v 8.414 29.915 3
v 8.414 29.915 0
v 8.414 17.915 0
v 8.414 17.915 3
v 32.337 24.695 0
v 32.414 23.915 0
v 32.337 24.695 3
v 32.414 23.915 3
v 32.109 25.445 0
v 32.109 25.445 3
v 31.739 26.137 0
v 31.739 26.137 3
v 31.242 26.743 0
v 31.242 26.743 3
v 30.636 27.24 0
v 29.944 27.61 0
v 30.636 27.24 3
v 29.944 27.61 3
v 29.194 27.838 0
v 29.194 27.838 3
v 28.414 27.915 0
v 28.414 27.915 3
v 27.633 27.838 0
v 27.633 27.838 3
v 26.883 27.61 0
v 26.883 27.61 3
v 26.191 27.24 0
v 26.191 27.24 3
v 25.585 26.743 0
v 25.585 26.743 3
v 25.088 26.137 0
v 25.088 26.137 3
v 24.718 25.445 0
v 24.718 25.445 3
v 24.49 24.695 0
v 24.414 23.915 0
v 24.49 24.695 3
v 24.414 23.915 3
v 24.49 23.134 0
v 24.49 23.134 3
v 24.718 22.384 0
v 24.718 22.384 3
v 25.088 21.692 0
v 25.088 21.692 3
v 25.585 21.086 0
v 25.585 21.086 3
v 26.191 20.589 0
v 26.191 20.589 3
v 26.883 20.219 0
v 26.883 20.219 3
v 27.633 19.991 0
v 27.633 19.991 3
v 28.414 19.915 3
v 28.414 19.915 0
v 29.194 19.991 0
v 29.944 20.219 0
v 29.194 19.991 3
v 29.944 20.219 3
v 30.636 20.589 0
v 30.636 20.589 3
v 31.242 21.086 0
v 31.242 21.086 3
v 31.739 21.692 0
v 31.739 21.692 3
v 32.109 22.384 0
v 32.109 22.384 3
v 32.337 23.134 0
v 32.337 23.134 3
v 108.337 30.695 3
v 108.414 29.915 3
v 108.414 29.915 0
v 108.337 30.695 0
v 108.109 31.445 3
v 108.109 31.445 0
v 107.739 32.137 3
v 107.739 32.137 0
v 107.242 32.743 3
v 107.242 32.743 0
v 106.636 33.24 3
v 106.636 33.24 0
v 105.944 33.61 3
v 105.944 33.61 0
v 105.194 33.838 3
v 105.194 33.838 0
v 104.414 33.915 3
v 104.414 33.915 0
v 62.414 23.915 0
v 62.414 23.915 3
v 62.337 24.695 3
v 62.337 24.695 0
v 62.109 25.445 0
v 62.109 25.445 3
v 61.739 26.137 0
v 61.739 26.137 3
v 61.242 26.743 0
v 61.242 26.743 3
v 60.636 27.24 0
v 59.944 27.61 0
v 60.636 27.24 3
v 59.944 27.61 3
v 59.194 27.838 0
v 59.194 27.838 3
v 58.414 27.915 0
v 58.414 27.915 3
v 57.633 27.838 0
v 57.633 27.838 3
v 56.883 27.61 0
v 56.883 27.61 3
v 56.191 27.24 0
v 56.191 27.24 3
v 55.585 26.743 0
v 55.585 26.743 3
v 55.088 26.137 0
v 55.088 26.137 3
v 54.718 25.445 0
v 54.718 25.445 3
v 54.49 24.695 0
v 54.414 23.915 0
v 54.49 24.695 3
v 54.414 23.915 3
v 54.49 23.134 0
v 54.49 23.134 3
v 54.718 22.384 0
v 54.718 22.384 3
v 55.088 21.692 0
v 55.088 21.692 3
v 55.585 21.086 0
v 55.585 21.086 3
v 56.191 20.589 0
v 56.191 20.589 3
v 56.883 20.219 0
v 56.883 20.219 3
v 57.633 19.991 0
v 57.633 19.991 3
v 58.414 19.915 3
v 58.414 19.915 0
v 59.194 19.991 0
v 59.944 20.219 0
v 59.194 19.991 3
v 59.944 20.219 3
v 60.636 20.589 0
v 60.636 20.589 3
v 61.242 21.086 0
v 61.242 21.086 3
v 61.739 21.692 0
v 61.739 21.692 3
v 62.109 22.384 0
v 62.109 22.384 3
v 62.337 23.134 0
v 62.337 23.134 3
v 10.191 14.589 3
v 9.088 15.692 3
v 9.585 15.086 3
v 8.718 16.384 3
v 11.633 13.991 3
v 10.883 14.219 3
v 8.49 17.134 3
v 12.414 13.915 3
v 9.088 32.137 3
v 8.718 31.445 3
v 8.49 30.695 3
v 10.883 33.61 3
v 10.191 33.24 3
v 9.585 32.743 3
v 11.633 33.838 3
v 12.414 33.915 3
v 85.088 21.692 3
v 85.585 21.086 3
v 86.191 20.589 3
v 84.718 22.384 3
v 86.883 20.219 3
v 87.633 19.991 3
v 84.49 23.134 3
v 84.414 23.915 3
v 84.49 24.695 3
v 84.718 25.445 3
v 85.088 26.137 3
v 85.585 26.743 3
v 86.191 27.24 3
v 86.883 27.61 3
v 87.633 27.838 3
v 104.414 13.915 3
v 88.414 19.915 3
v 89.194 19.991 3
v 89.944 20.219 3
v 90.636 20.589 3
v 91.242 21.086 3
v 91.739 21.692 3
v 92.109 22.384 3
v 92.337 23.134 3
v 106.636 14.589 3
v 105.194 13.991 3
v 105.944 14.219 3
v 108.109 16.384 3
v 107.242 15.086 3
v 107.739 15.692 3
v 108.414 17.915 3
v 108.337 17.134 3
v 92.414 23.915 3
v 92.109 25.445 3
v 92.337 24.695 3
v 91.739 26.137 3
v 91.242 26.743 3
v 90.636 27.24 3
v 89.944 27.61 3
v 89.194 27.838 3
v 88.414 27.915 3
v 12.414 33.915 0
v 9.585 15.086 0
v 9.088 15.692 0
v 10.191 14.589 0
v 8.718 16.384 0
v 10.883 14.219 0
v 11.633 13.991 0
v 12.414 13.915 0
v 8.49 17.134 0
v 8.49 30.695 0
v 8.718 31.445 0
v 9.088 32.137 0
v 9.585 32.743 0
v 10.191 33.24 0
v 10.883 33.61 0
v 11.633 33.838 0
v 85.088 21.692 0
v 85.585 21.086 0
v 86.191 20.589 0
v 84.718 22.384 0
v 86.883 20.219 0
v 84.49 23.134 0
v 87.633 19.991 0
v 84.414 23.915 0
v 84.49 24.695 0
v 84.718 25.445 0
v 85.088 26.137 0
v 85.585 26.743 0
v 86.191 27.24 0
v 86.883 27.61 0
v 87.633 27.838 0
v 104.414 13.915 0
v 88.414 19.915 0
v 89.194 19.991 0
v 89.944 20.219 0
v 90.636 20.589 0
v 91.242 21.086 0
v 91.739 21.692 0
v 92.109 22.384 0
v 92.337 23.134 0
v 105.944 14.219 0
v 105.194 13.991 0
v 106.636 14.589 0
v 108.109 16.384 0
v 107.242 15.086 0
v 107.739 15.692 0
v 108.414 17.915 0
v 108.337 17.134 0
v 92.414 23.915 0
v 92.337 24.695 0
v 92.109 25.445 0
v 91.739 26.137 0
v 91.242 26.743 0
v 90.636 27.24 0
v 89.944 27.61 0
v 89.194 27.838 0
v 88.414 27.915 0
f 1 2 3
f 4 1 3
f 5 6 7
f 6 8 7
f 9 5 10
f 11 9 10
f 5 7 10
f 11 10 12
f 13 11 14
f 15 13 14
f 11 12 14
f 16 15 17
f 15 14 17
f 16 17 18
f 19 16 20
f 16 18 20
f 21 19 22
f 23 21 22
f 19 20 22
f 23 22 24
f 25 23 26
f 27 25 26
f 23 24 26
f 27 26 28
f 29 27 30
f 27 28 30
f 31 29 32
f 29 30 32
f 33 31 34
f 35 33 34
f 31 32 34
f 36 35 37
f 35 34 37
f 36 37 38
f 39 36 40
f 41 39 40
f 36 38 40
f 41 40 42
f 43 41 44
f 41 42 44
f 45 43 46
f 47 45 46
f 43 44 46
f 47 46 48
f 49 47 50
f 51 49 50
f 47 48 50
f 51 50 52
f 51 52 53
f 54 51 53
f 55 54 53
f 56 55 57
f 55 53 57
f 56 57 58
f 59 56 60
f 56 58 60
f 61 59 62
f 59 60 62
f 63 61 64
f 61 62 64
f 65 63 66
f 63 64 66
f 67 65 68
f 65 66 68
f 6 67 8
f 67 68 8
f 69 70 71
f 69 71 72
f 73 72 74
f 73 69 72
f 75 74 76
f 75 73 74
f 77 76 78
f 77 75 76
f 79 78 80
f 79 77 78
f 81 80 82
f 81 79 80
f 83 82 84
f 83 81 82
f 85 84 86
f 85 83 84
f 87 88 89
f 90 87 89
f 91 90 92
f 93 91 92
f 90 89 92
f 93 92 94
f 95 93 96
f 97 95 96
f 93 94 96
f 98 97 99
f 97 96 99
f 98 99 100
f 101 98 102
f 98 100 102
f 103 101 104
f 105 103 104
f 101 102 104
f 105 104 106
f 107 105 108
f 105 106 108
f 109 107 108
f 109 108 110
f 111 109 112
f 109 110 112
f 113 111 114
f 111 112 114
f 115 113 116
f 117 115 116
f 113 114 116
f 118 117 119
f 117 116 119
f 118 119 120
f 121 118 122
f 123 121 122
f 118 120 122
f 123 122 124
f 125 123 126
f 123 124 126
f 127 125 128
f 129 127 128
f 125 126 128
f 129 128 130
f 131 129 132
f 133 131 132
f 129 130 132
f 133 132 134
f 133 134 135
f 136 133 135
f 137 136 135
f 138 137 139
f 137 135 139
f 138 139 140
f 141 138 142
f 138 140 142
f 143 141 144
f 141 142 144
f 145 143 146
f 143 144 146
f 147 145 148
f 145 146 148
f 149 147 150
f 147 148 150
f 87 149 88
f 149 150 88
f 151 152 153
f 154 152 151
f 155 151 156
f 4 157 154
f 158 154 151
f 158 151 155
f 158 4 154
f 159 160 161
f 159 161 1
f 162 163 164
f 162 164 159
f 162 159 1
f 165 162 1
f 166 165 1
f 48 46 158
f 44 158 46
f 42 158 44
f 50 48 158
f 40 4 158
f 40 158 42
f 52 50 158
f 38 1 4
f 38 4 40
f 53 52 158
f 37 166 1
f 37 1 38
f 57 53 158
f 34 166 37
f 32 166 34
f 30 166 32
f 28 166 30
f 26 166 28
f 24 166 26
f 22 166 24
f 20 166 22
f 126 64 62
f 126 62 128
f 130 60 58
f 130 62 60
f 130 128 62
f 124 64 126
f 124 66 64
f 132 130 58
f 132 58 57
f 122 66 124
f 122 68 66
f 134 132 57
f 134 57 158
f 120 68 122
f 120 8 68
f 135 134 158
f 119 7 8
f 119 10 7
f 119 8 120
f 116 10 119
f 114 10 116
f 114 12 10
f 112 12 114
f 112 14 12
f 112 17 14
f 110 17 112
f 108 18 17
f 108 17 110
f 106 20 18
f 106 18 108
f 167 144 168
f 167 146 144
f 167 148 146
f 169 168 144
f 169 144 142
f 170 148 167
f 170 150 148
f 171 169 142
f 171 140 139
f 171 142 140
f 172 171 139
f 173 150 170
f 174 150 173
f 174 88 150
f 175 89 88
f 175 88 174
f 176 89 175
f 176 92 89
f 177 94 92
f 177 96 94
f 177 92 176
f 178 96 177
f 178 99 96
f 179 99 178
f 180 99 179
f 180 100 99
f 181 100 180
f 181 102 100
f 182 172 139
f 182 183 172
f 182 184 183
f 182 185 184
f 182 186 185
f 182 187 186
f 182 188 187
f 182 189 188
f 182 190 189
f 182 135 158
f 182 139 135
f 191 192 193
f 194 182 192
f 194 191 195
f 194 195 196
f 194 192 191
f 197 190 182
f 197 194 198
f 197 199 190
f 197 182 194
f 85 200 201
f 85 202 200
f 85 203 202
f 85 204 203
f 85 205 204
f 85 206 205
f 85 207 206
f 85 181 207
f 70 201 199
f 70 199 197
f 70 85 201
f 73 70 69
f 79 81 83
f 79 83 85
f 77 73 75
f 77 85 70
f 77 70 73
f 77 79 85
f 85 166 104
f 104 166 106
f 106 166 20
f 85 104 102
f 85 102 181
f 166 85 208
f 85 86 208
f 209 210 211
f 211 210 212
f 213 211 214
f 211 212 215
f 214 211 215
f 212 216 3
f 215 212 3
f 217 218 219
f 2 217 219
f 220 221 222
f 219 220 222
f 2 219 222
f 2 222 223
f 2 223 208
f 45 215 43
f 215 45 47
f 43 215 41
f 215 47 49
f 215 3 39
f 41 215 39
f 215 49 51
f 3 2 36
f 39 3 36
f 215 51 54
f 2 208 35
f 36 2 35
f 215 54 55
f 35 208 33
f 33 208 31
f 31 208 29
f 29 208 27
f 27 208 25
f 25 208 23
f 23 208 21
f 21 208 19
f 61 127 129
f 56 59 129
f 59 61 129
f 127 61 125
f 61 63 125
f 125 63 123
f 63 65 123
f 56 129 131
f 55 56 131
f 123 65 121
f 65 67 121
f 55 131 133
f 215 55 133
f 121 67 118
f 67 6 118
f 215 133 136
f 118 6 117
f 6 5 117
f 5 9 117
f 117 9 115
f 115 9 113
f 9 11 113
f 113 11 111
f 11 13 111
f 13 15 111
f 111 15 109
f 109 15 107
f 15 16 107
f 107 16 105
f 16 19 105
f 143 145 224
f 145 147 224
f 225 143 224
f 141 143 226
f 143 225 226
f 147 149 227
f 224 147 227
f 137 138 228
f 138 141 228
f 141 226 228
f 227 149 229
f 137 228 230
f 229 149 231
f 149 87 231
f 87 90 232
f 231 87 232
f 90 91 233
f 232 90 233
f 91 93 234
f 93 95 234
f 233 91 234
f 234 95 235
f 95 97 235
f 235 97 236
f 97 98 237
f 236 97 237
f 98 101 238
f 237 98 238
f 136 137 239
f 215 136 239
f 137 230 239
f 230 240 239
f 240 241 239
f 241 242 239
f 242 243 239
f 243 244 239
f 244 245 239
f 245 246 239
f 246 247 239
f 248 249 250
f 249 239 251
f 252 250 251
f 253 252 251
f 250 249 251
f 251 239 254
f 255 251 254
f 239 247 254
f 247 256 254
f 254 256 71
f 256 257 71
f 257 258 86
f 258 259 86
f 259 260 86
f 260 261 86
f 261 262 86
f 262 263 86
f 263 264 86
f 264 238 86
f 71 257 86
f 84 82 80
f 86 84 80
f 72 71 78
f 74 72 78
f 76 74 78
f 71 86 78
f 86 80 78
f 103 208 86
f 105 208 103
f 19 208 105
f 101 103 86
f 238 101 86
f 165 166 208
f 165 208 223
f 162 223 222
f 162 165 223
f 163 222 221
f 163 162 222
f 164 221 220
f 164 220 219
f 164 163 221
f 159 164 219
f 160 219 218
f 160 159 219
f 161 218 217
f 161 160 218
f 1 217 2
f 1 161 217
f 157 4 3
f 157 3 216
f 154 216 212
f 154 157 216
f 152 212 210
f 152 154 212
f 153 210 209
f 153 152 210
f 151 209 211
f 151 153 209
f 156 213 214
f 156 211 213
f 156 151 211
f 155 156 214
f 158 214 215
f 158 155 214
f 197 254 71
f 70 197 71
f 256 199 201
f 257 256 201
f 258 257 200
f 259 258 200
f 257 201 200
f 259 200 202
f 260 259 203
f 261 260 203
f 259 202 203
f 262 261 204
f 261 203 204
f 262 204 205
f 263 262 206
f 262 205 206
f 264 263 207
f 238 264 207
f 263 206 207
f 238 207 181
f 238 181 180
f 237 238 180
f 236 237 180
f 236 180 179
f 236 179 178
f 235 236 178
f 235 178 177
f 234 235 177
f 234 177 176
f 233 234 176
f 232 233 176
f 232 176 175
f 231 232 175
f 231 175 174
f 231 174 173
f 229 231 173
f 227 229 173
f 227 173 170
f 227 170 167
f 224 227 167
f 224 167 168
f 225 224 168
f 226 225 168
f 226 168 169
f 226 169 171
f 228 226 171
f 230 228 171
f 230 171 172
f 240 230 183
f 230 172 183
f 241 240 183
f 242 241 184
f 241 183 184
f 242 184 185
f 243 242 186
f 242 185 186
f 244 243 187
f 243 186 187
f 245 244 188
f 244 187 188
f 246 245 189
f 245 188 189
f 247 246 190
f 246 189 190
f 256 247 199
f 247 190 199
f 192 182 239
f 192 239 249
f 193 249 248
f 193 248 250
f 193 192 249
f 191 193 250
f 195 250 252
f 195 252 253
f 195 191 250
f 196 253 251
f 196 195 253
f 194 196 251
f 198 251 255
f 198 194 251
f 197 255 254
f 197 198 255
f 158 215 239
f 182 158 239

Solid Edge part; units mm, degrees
sketch "Sketch1" plane through (0, 0, 0) normal (0, 0, 1) x (1, 0, 0)
  line L0 (8.4135, 13.9146) -> (108.4135, 13.9146)
  line L1 (108.4135, 13.9146) -> (108.4135, 33.9146)
  line L2 (108.4135, 33.9146) -> (8.4135, 33.9146)
  line L3 (8.4135, 33.9146) -> (8.4135, 13.9146)
extrude "Protrusion1" add sketch "Sketch1" along normal blind 3
fillet "Round_1" radius 4 4 edges at (8.4135, 13.9146, 1.5) (108.4135, 13.9146, 1.5) (108.4135, 33.9146, 1.5) (8.4135, 33.9146, 1.5)
sketch "Sketch2" plane through (58.4135, 23.9146, 3) normal (0, 0, 1) x (1, 0, 0)
  circle A0 centre (-30, 0) radius 4
  circle A1 centre (0, 0) radius 4
  circle A2 centre (30, 0) radius 4
  dimension "D1" = 20
  dimension "D2" = 20
extrude "Cutout1" cut sketch "Sketch2" against normal through all
